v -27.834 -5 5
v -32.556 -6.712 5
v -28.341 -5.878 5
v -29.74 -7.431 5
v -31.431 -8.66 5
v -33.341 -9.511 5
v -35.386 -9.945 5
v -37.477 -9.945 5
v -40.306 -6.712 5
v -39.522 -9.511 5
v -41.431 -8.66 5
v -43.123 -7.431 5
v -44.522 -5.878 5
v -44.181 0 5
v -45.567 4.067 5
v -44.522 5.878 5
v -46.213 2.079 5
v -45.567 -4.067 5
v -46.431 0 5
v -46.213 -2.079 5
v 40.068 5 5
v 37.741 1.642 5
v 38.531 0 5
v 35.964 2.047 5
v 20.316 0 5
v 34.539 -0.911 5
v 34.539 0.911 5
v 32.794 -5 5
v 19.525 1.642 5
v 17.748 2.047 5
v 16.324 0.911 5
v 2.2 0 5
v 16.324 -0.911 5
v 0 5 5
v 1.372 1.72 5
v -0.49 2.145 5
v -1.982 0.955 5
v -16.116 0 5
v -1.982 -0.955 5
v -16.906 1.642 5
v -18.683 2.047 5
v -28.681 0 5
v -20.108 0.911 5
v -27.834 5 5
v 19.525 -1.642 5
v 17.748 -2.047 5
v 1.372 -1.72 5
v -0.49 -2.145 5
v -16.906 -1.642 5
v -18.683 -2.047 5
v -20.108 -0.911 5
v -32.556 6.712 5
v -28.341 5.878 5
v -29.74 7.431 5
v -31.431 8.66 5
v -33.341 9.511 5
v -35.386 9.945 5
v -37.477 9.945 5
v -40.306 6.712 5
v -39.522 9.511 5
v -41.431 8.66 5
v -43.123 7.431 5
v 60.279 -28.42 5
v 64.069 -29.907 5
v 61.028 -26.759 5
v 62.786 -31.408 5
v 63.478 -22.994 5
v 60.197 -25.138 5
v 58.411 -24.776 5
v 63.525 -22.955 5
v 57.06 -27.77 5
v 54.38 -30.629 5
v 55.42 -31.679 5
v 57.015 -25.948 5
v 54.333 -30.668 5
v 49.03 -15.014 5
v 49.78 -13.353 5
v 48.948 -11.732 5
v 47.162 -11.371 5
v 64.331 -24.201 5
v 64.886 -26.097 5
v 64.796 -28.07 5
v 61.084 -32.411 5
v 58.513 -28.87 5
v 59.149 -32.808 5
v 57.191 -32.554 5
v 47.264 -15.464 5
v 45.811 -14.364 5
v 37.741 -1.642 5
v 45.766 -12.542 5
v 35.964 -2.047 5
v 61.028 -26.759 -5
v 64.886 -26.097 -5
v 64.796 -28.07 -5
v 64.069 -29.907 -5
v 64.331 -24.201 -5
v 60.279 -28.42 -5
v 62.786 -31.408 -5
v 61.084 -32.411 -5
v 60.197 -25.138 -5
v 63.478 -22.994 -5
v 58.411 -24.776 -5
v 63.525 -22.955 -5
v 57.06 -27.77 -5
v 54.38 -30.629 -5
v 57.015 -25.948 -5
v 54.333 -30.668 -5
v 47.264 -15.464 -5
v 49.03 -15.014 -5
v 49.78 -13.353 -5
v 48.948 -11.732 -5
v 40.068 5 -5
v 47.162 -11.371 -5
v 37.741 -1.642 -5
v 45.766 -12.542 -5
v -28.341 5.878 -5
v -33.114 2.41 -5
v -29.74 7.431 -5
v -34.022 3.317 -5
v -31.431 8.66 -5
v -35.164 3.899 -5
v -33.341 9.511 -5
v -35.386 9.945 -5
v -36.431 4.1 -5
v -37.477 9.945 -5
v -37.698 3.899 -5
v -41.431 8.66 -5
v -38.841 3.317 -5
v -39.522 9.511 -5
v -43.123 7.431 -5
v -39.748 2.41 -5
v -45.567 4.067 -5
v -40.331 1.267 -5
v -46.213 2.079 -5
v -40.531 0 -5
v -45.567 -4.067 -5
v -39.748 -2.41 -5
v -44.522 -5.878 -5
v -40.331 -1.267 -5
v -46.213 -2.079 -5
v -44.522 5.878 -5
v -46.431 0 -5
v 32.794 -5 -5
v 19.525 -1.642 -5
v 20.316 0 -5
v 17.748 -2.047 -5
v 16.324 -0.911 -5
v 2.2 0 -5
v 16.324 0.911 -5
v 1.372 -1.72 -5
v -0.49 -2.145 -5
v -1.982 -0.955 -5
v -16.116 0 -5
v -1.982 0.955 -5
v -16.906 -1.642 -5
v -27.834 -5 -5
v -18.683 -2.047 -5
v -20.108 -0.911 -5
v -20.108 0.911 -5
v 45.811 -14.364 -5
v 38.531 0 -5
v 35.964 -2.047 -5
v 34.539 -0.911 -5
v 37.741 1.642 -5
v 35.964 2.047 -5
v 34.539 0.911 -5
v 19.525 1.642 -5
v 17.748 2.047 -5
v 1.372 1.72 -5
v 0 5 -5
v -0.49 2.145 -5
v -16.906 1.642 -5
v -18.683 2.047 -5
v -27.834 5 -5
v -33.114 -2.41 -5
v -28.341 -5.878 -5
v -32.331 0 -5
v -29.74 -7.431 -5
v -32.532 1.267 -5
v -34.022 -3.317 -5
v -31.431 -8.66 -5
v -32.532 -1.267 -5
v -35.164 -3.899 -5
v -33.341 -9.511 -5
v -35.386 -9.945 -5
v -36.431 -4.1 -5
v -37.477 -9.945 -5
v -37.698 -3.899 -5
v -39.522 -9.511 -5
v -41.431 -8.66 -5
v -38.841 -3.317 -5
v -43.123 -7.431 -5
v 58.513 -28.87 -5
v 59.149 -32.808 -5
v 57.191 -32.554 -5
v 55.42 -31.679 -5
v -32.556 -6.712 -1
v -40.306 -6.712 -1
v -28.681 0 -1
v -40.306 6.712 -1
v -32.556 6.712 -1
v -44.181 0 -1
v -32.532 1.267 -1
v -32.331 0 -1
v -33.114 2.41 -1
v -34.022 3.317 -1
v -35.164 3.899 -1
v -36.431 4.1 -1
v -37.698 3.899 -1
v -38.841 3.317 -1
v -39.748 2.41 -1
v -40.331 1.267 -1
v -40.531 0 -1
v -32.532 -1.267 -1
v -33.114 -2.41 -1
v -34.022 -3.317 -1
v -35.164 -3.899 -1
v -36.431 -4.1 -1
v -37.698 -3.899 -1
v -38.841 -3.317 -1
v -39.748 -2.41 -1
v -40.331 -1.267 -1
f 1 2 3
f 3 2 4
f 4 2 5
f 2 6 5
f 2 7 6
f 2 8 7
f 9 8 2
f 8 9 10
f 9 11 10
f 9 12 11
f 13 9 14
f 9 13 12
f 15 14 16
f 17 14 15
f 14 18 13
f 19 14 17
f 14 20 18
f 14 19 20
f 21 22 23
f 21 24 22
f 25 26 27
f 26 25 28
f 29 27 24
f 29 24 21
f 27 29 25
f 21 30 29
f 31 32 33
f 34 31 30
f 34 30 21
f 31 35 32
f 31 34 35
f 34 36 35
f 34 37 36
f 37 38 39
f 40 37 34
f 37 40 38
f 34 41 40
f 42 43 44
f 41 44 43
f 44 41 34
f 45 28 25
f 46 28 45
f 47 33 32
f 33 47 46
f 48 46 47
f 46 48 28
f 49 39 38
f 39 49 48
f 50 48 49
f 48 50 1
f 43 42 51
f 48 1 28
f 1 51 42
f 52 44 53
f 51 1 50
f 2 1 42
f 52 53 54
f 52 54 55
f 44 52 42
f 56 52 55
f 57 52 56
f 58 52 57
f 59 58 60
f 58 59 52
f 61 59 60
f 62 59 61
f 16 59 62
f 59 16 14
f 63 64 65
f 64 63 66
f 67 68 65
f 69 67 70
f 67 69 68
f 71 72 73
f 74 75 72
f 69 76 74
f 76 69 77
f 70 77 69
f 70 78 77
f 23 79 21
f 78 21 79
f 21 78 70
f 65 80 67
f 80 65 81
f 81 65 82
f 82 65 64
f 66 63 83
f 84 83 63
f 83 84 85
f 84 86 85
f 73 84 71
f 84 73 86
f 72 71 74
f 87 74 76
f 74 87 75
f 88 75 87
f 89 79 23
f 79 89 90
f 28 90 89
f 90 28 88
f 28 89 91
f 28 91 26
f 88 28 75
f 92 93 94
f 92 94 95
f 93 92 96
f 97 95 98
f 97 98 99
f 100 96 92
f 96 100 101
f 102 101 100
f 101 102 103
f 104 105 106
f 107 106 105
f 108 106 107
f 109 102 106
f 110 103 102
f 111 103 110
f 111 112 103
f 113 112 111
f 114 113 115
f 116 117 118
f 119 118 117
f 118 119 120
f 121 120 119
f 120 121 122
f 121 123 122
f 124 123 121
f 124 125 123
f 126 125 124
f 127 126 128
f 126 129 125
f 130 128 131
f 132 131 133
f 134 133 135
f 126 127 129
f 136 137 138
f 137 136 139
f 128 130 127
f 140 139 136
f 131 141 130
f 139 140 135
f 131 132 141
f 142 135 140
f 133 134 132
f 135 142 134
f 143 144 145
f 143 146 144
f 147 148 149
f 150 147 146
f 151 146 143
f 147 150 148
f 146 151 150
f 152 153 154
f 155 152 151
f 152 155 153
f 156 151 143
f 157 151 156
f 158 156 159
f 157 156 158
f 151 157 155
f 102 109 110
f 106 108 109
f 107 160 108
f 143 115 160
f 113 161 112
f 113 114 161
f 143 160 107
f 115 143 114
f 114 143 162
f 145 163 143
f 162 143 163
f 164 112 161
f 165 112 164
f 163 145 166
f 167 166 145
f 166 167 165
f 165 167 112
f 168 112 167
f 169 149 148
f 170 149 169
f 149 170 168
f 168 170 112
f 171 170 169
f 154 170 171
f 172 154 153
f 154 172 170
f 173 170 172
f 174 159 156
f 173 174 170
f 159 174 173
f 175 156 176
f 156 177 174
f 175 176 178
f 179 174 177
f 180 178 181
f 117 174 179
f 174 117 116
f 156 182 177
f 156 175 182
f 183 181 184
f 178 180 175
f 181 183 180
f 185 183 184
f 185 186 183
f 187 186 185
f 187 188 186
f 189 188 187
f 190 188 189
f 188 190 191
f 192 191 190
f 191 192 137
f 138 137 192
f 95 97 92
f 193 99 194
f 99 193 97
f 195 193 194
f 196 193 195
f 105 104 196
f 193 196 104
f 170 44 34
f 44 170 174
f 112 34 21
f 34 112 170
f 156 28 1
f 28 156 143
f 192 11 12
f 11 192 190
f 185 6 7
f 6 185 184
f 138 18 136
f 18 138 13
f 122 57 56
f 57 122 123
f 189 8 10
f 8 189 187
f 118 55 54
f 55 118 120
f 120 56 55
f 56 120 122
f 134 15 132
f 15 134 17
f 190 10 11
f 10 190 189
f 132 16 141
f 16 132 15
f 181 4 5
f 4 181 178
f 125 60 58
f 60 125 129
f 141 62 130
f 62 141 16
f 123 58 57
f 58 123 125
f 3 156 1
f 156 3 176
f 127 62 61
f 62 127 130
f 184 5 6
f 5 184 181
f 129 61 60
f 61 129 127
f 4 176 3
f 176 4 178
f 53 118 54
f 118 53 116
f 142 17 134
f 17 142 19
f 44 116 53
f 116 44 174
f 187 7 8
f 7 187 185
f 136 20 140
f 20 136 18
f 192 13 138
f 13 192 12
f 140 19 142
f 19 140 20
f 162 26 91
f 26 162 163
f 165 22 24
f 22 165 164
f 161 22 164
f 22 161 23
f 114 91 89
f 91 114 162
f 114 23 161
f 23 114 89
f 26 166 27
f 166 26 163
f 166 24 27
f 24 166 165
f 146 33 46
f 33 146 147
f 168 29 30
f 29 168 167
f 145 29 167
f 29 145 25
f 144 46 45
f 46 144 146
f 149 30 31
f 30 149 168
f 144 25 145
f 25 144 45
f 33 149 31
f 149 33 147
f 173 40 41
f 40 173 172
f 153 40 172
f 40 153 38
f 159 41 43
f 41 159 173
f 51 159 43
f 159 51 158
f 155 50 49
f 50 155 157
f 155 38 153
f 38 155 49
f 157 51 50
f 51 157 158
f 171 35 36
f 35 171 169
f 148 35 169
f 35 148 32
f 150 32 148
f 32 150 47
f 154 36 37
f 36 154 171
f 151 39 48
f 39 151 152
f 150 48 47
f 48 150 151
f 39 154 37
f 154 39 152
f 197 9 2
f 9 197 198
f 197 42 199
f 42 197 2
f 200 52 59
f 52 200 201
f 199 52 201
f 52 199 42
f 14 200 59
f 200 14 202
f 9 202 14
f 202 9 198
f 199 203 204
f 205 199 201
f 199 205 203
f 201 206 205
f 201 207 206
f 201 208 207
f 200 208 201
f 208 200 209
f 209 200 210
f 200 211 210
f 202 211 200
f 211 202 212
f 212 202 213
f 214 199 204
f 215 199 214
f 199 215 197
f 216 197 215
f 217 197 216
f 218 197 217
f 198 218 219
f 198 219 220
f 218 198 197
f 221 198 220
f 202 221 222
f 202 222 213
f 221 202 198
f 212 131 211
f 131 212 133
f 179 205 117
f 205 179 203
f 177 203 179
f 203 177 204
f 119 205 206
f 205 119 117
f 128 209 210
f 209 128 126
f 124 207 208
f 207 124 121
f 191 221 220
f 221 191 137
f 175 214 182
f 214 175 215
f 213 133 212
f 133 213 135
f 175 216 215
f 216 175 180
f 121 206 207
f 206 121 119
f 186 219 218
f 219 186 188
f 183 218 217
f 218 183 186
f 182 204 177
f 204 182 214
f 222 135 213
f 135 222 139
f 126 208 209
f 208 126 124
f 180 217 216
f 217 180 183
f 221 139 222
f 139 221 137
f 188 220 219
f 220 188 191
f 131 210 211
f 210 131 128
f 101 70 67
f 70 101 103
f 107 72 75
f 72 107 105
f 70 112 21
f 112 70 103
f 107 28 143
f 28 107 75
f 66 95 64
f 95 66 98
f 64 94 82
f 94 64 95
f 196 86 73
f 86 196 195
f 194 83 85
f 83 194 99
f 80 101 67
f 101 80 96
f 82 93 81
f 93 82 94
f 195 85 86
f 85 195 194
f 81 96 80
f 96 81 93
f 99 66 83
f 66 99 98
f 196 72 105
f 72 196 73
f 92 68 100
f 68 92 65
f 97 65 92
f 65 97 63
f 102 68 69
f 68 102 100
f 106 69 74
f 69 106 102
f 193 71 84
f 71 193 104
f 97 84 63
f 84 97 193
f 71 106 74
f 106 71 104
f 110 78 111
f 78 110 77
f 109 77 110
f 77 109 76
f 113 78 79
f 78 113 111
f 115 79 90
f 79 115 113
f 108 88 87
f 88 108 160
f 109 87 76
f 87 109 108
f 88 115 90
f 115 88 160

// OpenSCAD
espesor_pieza=10;
ancho_pieza=10;
longitud_tensor=70;
longitud_brazo=53;
longitud_brazo_suspension=50;
finalanterior=1;
//longitud_brazo_suspension=longitud_brazo_suspension-10;
var_transit=longitud_tensor;
//longitud_tensor=var_transit-10;

longitud_brazo_diagonal=sqrt(pow(longitud_brazo,2)+pow(longitud_brazo_suspension,2));
//longitud_brazo_diagonal=35;

echo (longitud_brazo_diagonal);

suspension();
//brazo_diagonal();
module suspension(){
	difference(){
		union(){
			//brazo principal HORIZONTAL
			brazo_diagonal();
			
			if (finalanterior==0){
			translate([longitud_brazo_diagonal/2,0,0])
			rotate([0,0,40])
			brazotensor();			
			}
			else{
				
				translate([longitud_brazo_diagonal/2,0,0])
				rotate([0,0,-50])
				brazotensor();
			}
		
			//placa apoyo
			//translate([(-longitud_brazo+ancho_pieza*2.5)/2,-ancho_pieza*1.5,-2.5])
			//cube([20,20,5], center=true);
		}
		/*
		
		translate([(-longitud_brazo)/2,,0,])
			cube([20,longitud_brazo_suspension-ancho_pieza,40], center=true);
		translate([(longitud_brazo)/2,-longitud_brazo_suspension +(ancho_pieza/4),0])
			cube([20,longitud_brazo_suspension/2+ancho_pieza,40], center=true);
		
		translate([longitud_brazo_diagonal/2,0,3])
			
		cube([longitud_brazo_suspension-10,ancho_pieza-2 ,espesor_pieza],center=true);
		
		translate([longitud_brazo_diagonal/2,0,0])
		cylinder(r=8.2/2, h=espesor_pieza*3,$fn=20, center=true);
		*/
		if (finalanterior==0){
			translate([0,-ancho_pieza/2-20,-10])
			
				cube([50,20,50]);
						
			}
			else{
				translate([0,+ancho_pieza/2,-10])
			
				cube([50,100,50]);
			}
		
	}
}

module brazotensor(){
	difference(){
		union(){
			cube([longitud_tensor,ancho_pieza+2 ,espesor_pieza],center=true);
			translate([longitud_tensor/2,0,0])
			cylinder(r=ancho_pieza/2+1, h=espesor_pieza, center=true);
			translate([-longitud_tensor/2,0,0])
			cylinder(r=ancho_pieza/2+1, h=espesor_pieza, center=true);
		}
		translate([longitud_tensor/2,0,0])
		cylinder(r=4.2/2, h=20, center=true);
		translate([-longitud_tensor/2,0,0])
		cylinder(r=4.2/2, h=20, center=true);
		translate([longitud_tensor/4,0,0])
		cylinder(r=4.2/2, h=20, center=true);
		translate([-longitud_tensor/4,0,0])
		cylinder(r=4.2/2, h=20, center=true);

		cylinder(r=4.4/2, h=20, center=true);

		
	}


}



module brazo_diagonal(){
	difference(){
		union(){
			
			cube([longitud_brazo_diagonal,ancho_pieza ,espesor_pieza],center=true);
			translate([longitud_brazo_diagonal/2,0,0])
			cylinder(r=ancho_pieza/2, h=espesor_pieza, center=true);
			translate([-longitud_brazo_diagonal/2,0,0])
			cylinder(r=ancho_pieza/2, h=espesor_pieza, center=true);

			//redondeo alojamiento tuerca
			translate([-longitud_brazo_diagonal/2,0,0])
			cylinder(r=20/2, h=espesor_pieza, center=true);
			/*
			//redondeo alojamiento muelle
			translate([longitud_brazo_diagonal/2,0,0])
			cylinder(r=20/2, h=espesor_pieza, center=true);
			*/
		}
		translate([longitud_brazo_diagonal/2,0,0])
		cylinder(r=4.2/2, h=20, center=true);
		translate([-longitud_brazo_diagonal/2,0,0])
		cylinder(r=4.2/2, h=20, center=true);
		translate([longitud_brazo_diagonal/4,0,0])
		cylinder(r=4.2/2, h=20, center=true);
		translate([-longitud_brazo_diagonal/4,0,0])
		cylinder(r=4.2/2, h=20, center=true);

		cylinder(r=4.4/2, h=20, center=true);

		//ALOJAMIENTO TUERCA
		/*bulbo
		translate([-longitud_brazo_diagonal/2,0,-espesor_pieza/2])
		cylinder(r=15.5/2, h=espesor_pieza*2-2,$fn=6);
		*/
		translate([-longitud_brazo_diagonal/2,0,-espesor_pieza/2+4])
		cylinder(r=15.5/2, h=espesor_pieza*2-2,$fn=6);
		//EJE TUERCA
		
		translate([-longitud_brazo_diagonal/2,0,0])
		cylinder(r=8.2/2, h=espesor_pieza*3,$fn=20, center=true);
	}

}


//brazotensor();
